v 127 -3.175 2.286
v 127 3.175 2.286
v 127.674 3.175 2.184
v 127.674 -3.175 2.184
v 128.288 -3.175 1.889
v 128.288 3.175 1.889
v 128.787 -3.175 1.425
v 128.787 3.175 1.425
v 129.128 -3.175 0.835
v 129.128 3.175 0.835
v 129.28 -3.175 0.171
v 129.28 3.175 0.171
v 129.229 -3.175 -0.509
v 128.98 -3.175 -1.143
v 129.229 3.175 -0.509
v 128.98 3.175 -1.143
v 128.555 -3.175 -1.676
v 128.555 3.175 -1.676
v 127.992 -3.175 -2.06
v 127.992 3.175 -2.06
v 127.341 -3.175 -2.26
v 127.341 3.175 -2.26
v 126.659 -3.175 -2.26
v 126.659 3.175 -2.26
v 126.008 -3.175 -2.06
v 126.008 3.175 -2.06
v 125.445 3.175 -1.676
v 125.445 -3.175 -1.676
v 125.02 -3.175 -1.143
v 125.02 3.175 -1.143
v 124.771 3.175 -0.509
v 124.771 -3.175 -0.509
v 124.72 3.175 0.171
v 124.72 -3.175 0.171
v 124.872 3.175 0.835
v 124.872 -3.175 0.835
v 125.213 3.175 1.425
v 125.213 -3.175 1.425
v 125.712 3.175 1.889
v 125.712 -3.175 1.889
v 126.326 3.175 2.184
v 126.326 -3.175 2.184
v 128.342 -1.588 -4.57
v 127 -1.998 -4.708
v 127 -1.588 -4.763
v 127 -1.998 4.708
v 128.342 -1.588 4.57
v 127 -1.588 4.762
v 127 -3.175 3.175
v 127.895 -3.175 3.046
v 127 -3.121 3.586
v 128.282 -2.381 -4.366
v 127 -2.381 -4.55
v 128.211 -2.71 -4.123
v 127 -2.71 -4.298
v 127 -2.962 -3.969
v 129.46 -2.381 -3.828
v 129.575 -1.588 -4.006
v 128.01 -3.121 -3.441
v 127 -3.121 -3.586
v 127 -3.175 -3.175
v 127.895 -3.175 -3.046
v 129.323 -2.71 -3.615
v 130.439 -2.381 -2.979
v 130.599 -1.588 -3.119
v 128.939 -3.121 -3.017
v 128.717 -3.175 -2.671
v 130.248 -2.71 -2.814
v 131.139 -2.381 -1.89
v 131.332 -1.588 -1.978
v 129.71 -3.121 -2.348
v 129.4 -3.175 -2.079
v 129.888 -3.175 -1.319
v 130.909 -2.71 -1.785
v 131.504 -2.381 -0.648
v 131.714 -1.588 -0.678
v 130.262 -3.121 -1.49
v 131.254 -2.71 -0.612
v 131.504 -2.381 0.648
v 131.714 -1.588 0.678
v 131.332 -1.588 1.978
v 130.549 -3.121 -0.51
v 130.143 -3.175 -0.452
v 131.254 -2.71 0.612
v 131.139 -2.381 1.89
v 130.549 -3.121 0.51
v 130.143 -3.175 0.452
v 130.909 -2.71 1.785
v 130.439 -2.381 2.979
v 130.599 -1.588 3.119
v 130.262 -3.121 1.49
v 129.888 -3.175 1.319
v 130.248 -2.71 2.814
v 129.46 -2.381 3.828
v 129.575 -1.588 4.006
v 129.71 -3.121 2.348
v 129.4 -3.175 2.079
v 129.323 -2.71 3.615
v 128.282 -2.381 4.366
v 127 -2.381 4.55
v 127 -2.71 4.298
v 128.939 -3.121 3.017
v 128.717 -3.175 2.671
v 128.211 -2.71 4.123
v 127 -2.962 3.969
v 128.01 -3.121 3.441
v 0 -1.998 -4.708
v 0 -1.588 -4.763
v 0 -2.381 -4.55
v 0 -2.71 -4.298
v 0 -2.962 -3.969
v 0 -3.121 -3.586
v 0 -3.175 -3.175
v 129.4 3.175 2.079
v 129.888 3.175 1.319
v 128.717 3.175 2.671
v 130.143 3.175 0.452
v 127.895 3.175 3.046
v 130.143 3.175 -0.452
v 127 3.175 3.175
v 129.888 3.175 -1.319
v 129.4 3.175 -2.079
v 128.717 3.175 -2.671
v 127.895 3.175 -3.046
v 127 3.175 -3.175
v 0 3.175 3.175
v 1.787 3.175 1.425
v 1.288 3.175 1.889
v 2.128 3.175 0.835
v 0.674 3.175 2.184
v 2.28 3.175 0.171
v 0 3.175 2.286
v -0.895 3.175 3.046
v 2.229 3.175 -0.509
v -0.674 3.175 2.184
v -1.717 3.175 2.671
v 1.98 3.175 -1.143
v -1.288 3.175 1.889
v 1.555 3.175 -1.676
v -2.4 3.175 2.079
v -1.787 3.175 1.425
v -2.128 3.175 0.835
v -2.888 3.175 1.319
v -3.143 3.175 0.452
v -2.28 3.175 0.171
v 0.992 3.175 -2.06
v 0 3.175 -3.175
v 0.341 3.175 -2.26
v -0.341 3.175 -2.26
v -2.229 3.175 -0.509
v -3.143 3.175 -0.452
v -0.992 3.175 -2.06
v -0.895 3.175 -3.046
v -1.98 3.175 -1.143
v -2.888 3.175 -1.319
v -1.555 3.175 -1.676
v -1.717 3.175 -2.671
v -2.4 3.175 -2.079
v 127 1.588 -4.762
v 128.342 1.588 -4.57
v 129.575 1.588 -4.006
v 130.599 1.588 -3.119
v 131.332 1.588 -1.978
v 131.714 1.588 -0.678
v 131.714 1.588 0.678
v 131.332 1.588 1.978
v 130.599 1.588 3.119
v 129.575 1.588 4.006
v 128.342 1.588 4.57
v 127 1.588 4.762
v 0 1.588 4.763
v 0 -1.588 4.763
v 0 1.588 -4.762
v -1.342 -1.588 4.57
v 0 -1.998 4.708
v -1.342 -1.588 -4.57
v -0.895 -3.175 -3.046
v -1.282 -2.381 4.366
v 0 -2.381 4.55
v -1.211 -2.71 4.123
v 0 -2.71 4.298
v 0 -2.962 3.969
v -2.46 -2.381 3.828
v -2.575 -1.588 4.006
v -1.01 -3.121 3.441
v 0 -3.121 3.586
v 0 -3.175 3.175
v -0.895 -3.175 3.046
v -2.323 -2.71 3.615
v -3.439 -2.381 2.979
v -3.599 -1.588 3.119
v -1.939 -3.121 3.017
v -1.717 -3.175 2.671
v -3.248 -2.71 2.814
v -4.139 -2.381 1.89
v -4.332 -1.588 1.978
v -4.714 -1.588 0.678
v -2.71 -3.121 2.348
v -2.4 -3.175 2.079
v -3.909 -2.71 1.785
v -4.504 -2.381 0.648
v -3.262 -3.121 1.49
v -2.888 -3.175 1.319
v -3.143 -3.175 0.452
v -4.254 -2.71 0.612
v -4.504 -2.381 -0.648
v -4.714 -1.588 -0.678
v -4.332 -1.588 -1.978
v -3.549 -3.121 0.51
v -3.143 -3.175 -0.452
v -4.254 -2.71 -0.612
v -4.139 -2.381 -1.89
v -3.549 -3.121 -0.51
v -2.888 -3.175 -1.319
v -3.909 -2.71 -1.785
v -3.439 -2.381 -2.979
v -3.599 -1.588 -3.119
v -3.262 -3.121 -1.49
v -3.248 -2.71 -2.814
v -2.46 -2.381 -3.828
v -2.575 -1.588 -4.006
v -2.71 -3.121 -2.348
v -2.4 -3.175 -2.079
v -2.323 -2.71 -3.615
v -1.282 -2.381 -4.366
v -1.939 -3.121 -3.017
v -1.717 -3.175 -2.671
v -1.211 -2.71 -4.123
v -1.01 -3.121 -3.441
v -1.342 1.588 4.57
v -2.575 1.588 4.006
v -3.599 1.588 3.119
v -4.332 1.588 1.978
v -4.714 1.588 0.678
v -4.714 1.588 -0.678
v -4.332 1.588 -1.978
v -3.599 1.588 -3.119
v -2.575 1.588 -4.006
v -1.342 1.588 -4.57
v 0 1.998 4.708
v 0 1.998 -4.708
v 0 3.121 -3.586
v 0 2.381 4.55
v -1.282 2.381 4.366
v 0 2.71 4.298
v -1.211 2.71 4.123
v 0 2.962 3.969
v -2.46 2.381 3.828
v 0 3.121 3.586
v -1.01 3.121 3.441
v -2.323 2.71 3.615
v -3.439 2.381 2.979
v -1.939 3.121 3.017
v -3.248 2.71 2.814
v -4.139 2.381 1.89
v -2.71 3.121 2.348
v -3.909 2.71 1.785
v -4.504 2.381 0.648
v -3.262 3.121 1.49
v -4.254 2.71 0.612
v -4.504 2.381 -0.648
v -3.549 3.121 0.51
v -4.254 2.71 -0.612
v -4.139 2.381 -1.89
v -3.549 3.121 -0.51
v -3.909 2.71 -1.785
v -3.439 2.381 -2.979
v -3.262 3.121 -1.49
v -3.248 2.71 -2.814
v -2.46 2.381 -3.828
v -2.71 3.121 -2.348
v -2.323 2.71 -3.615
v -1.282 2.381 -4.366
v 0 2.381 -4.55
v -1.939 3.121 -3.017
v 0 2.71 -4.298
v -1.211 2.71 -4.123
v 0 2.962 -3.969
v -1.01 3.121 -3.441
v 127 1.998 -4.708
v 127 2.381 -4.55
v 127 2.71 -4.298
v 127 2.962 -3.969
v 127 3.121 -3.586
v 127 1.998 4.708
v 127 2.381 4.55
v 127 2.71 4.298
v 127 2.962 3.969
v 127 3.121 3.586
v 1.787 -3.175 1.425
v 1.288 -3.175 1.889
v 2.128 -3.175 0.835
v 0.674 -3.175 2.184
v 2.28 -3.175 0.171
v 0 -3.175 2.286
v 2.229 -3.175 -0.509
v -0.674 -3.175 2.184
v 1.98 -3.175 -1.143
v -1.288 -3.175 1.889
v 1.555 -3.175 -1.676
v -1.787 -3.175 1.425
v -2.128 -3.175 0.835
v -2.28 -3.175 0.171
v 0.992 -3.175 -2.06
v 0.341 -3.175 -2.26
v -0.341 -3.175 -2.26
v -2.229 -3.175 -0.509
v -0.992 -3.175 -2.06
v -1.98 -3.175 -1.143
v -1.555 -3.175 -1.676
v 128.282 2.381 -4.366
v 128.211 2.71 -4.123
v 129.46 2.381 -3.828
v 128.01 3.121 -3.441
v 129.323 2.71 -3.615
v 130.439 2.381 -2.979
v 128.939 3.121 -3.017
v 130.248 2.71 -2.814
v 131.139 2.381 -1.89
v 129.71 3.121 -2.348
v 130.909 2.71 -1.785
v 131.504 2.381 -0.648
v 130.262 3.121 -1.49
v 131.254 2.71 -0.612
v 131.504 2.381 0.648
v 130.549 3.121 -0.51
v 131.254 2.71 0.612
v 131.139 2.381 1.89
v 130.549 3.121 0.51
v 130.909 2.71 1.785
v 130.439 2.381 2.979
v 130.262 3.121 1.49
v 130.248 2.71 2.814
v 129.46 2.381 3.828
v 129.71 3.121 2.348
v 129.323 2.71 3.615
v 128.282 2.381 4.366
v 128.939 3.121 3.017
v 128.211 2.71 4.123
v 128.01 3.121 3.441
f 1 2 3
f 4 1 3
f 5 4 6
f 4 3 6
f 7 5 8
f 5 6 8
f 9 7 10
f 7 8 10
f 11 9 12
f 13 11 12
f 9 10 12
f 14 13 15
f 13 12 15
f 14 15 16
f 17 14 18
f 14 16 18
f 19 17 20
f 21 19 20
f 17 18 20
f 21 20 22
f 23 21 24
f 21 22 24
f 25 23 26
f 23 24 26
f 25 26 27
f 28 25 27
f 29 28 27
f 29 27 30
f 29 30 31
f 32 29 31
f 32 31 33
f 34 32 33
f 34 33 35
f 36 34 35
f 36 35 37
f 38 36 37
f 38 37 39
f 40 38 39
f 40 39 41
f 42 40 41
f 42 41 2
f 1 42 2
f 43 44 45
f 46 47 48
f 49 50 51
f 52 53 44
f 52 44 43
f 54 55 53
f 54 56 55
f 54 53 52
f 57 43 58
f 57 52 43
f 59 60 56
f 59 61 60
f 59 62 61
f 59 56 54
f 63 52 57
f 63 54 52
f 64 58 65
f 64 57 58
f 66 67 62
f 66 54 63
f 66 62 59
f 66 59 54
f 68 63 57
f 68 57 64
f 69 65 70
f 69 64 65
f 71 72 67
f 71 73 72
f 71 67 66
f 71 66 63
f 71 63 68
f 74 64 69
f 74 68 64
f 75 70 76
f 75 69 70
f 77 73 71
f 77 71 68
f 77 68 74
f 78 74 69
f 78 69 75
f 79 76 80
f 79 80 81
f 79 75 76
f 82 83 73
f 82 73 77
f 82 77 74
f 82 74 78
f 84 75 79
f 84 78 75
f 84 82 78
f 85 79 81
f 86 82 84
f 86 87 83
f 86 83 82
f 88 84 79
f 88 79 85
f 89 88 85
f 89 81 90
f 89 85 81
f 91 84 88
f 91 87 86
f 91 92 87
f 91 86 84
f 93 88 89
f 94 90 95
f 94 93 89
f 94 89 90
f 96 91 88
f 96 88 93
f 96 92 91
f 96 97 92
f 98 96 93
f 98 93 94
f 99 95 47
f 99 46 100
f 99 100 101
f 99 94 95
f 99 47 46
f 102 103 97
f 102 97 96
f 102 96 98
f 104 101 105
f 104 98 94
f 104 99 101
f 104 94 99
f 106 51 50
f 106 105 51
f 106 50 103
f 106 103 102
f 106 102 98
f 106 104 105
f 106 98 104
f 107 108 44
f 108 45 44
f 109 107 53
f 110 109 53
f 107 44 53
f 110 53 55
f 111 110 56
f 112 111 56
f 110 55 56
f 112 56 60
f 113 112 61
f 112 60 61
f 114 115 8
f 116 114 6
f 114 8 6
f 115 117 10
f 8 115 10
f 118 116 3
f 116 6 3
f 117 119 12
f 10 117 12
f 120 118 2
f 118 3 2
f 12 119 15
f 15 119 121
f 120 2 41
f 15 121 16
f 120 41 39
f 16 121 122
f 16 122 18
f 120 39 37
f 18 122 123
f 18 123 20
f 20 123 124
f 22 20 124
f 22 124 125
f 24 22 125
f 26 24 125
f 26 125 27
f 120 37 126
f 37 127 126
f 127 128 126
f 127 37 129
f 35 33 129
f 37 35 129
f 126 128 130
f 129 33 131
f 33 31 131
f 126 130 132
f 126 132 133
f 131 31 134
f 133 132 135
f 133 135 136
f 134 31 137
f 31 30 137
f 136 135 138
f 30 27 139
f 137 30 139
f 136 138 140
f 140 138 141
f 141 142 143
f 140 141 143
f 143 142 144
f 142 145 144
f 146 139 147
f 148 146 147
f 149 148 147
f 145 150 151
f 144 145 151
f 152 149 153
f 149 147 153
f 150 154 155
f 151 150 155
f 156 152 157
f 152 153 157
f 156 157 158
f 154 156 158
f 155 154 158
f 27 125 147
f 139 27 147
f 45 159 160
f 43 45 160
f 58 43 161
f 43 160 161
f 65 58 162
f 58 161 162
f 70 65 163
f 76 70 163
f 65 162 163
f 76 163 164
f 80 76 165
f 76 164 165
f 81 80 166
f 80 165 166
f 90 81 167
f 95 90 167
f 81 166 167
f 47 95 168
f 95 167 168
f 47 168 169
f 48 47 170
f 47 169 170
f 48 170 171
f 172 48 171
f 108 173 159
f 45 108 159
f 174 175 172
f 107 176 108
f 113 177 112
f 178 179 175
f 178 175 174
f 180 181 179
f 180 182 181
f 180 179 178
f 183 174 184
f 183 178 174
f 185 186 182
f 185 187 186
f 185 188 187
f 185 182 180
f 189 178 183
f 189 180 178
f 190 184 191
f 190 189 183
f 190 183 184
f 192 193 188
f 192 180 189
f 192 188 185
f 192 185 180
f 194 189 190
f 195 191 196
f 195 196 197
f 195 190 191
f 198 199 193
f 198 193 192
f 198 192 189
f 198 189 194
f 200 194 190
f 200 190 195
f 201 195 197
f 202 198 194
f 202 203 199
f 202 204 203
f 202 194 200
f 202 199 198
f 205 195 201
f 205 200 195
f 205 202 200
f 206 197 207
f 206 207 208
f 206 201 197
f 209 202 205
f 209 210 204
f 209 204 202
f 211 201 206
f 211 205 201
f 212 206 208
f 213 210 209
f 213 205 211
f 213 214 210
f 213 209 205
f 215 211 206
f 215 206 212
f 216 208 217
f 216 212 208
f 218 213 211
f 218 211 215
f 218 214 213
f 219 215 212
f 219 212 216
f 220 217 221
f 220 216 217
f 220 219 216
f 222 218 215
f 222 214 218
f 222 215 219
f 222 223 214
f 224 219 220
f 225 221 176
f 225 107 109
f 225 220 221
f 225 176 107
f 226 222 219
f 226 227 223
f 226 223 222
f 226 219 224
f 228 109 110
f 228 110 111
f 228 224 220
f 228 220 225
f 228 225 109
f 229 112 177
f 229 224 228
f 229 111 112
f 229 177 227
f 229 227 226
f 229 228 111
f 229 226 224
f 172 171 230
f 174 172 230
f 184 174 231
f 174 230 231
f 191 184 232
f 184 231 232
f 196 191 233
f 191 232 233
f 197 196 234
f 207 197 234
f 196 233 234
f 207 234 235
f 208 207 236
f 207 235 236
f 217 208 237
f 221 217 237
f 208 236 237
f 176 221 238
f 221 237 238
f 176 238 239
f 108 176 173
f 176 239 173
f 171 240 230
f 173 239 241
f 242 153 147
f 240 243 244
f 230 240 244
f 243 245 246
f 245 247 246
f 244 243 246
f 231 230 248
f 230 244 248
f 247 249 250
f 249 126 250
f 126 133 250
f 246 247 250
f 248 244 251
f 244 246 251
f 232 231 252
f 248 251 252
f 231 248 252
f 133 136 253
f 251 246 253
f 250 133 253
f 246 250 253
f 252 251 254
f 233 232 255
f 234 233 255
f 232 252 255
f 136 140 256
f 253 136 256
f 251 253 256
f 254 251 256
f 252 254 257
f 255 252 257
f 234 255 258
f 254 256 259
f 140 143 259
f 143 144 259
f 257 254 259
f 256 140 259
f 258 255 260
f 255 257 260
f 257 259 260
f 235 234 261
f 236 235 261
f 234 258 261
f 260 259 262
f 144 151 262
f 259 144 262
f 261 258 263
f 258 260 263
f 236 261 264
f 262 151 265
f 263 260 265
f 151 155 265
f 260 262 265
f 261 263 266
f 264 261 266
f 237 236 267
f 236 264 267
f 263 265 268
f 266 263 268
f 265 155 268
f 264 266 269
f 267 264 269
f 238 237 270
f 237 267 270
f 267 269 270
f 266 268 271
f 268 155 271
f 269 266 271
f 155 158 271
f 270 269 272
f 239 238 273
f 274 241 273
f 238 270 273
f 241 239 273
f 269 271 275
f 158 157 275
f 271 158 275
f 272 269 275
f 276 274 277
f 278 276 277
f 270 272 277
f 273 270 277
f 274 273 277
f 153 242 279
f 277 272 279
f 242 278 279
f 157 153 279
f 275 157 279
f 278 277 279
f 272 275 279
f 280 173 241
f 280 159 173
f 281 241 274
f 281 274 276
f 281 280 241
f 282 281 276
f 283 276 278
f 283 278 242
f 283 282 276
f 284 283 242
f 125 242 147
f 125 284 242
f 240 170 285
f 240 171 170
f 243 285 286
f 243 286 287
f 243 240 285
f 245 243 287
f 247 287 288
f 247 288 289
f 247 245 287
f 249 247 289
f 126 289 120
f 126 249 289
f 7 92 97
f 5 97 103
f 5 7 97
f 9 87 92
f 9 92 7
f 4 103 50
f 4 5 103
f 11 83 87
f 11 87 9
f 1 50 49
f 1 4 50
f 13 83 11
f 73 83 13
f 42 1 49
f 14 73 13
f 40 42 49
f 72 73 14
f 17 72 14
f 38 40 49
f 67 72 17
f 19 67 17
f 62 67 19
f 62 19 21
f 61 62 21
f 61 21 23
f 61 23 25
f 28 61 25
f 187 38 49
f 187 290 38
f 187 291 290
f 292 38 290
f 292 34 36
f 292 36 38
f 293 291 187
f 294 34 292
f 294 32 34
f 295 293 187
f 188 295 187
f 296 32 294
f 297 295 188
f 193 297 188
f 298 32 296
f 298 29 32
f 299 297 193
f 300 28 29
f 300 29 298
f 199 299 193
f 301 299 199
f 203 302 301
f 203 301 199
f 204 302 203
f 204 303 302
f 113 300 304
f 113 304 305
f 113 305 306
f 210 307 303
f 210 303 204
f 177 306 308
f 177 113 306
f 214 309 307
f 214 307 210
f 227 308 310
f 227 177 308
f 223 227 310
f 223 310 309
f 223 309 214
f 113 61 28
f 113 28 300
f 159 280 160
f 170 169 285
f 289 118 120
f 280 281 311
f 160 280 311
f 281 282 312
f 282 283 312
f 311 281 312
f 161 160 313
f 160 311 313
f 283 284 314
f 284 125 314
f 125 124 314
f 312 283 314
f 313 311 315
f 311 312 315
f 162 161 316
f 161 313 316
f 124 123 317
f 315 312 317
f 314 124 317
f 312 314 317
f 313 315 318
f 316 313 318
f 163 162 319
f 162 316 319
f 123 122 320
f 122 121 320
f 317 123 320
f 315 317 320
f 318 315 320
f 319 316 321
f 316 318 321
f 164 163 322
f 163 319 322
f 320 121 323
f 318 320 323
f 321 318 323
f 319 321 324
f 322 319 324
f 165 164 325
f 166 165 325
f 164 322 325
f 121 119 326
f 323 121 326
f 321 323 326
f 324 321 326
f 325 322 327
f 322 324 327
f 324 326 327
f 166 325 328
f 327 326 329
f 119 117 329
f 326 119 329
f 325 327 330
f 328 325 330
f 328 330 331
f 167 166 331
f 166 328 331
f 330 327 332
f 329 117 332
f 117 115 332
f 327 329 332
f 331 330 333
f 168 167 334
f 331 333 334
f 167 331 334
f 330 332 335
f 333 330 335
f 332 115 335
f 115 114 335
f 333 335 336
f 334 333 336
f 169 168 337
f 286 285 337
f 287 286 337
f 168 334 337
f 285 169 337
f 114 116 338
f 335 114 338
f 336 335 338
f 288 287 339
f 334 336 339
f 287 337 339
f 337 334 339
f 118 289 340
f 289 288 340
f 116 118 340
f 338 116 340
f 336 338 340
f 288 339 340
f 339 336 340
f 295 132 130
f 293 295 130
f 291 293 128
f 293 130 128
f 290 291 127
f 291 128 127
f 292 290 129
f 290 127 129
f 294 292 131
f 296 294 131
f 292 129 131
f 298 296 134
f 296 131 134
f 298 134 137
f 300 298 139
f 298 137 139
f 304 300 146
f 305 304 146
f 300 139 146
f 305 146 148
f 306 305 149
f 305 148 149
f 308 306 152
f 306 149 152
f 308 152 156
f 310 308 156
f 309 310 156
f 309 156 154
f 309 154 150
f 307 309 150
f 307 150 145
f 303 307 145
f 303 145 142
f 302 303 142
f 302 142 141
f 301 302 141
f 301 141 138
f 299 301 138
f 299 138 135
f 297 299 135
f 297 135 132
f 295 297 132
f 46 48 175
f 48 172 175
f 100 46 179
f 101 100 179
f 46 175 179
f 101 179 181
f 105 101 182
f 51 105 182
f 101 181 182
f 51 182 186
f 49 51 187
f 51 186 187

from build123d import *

# Parameters (mm, degrees)
BOSS_EXTRUDE1_DEPTH = 3.175
SKETCH2_R           = 2.286
CUT_EXTRUDE1_DEPTH  = 133.001364813
FILLET1_R           = 1.5875


with BuildPart() as part:
    # Sketch1 → Boss-Extrude1 (new, symmetric)
    with BuildSketch(Plane(origin=(0, 0, 0), x_dir=(1, 0, 0), z_dir=(0, 1, 0))):
        with BuildLine():
            Line((0, 4.7625), (127, 4.7625))
            ThreePointArc((127, 4.7625), (131.7625, 0), (127, -4.7625))
            Line((127, -4.7625), (0, -4.7625))
            ThreePointArc((0, -4.7625), (-4.7625, 0), (0, 4.7625))
        make_face()
    extrude(amount=BOSS_EXTRUDE1_DEPTH, both=True)

    # Sketch2 → Cut-Extrude1 (cut, through all)
    with BuildSketch(Plane(origin=(0, 3.175, 0), x_dir=(1, 0, 0), z_dir=(0, 1, 0))):
        with Locations(Location((0, 0, 0), (0, 0, 270))):
            Circle(SKETCH2_R)
        with Locations(Location((127, 0, 0), (0, 0, 270))):
            Circle(SKETCH2_R)
    extrude(amount=-CUT_EXTRUDE1_DEPTH, mode=Mode.SUBTRACT)

    # Fillet1
    fillet1_edges = [part.edges().sort_by_distance(p)[0] for p in [
        (131.7625, 3.175, 0),
        (63.5, 3.175, -4.7625),
        (-4.7625, 3.175, 0),
        (63.5, -3.175, -4.7625),
        (131.7625, -3.175, 0),
        (63.5, -3.175, 4.7625),
        (-4.7625, -3.175, 0),
        (63.5, 3.175, 4.7625),
    ]]
    fillet(fillet1_edges, radius=FILLET1_R)


solid = part.part
